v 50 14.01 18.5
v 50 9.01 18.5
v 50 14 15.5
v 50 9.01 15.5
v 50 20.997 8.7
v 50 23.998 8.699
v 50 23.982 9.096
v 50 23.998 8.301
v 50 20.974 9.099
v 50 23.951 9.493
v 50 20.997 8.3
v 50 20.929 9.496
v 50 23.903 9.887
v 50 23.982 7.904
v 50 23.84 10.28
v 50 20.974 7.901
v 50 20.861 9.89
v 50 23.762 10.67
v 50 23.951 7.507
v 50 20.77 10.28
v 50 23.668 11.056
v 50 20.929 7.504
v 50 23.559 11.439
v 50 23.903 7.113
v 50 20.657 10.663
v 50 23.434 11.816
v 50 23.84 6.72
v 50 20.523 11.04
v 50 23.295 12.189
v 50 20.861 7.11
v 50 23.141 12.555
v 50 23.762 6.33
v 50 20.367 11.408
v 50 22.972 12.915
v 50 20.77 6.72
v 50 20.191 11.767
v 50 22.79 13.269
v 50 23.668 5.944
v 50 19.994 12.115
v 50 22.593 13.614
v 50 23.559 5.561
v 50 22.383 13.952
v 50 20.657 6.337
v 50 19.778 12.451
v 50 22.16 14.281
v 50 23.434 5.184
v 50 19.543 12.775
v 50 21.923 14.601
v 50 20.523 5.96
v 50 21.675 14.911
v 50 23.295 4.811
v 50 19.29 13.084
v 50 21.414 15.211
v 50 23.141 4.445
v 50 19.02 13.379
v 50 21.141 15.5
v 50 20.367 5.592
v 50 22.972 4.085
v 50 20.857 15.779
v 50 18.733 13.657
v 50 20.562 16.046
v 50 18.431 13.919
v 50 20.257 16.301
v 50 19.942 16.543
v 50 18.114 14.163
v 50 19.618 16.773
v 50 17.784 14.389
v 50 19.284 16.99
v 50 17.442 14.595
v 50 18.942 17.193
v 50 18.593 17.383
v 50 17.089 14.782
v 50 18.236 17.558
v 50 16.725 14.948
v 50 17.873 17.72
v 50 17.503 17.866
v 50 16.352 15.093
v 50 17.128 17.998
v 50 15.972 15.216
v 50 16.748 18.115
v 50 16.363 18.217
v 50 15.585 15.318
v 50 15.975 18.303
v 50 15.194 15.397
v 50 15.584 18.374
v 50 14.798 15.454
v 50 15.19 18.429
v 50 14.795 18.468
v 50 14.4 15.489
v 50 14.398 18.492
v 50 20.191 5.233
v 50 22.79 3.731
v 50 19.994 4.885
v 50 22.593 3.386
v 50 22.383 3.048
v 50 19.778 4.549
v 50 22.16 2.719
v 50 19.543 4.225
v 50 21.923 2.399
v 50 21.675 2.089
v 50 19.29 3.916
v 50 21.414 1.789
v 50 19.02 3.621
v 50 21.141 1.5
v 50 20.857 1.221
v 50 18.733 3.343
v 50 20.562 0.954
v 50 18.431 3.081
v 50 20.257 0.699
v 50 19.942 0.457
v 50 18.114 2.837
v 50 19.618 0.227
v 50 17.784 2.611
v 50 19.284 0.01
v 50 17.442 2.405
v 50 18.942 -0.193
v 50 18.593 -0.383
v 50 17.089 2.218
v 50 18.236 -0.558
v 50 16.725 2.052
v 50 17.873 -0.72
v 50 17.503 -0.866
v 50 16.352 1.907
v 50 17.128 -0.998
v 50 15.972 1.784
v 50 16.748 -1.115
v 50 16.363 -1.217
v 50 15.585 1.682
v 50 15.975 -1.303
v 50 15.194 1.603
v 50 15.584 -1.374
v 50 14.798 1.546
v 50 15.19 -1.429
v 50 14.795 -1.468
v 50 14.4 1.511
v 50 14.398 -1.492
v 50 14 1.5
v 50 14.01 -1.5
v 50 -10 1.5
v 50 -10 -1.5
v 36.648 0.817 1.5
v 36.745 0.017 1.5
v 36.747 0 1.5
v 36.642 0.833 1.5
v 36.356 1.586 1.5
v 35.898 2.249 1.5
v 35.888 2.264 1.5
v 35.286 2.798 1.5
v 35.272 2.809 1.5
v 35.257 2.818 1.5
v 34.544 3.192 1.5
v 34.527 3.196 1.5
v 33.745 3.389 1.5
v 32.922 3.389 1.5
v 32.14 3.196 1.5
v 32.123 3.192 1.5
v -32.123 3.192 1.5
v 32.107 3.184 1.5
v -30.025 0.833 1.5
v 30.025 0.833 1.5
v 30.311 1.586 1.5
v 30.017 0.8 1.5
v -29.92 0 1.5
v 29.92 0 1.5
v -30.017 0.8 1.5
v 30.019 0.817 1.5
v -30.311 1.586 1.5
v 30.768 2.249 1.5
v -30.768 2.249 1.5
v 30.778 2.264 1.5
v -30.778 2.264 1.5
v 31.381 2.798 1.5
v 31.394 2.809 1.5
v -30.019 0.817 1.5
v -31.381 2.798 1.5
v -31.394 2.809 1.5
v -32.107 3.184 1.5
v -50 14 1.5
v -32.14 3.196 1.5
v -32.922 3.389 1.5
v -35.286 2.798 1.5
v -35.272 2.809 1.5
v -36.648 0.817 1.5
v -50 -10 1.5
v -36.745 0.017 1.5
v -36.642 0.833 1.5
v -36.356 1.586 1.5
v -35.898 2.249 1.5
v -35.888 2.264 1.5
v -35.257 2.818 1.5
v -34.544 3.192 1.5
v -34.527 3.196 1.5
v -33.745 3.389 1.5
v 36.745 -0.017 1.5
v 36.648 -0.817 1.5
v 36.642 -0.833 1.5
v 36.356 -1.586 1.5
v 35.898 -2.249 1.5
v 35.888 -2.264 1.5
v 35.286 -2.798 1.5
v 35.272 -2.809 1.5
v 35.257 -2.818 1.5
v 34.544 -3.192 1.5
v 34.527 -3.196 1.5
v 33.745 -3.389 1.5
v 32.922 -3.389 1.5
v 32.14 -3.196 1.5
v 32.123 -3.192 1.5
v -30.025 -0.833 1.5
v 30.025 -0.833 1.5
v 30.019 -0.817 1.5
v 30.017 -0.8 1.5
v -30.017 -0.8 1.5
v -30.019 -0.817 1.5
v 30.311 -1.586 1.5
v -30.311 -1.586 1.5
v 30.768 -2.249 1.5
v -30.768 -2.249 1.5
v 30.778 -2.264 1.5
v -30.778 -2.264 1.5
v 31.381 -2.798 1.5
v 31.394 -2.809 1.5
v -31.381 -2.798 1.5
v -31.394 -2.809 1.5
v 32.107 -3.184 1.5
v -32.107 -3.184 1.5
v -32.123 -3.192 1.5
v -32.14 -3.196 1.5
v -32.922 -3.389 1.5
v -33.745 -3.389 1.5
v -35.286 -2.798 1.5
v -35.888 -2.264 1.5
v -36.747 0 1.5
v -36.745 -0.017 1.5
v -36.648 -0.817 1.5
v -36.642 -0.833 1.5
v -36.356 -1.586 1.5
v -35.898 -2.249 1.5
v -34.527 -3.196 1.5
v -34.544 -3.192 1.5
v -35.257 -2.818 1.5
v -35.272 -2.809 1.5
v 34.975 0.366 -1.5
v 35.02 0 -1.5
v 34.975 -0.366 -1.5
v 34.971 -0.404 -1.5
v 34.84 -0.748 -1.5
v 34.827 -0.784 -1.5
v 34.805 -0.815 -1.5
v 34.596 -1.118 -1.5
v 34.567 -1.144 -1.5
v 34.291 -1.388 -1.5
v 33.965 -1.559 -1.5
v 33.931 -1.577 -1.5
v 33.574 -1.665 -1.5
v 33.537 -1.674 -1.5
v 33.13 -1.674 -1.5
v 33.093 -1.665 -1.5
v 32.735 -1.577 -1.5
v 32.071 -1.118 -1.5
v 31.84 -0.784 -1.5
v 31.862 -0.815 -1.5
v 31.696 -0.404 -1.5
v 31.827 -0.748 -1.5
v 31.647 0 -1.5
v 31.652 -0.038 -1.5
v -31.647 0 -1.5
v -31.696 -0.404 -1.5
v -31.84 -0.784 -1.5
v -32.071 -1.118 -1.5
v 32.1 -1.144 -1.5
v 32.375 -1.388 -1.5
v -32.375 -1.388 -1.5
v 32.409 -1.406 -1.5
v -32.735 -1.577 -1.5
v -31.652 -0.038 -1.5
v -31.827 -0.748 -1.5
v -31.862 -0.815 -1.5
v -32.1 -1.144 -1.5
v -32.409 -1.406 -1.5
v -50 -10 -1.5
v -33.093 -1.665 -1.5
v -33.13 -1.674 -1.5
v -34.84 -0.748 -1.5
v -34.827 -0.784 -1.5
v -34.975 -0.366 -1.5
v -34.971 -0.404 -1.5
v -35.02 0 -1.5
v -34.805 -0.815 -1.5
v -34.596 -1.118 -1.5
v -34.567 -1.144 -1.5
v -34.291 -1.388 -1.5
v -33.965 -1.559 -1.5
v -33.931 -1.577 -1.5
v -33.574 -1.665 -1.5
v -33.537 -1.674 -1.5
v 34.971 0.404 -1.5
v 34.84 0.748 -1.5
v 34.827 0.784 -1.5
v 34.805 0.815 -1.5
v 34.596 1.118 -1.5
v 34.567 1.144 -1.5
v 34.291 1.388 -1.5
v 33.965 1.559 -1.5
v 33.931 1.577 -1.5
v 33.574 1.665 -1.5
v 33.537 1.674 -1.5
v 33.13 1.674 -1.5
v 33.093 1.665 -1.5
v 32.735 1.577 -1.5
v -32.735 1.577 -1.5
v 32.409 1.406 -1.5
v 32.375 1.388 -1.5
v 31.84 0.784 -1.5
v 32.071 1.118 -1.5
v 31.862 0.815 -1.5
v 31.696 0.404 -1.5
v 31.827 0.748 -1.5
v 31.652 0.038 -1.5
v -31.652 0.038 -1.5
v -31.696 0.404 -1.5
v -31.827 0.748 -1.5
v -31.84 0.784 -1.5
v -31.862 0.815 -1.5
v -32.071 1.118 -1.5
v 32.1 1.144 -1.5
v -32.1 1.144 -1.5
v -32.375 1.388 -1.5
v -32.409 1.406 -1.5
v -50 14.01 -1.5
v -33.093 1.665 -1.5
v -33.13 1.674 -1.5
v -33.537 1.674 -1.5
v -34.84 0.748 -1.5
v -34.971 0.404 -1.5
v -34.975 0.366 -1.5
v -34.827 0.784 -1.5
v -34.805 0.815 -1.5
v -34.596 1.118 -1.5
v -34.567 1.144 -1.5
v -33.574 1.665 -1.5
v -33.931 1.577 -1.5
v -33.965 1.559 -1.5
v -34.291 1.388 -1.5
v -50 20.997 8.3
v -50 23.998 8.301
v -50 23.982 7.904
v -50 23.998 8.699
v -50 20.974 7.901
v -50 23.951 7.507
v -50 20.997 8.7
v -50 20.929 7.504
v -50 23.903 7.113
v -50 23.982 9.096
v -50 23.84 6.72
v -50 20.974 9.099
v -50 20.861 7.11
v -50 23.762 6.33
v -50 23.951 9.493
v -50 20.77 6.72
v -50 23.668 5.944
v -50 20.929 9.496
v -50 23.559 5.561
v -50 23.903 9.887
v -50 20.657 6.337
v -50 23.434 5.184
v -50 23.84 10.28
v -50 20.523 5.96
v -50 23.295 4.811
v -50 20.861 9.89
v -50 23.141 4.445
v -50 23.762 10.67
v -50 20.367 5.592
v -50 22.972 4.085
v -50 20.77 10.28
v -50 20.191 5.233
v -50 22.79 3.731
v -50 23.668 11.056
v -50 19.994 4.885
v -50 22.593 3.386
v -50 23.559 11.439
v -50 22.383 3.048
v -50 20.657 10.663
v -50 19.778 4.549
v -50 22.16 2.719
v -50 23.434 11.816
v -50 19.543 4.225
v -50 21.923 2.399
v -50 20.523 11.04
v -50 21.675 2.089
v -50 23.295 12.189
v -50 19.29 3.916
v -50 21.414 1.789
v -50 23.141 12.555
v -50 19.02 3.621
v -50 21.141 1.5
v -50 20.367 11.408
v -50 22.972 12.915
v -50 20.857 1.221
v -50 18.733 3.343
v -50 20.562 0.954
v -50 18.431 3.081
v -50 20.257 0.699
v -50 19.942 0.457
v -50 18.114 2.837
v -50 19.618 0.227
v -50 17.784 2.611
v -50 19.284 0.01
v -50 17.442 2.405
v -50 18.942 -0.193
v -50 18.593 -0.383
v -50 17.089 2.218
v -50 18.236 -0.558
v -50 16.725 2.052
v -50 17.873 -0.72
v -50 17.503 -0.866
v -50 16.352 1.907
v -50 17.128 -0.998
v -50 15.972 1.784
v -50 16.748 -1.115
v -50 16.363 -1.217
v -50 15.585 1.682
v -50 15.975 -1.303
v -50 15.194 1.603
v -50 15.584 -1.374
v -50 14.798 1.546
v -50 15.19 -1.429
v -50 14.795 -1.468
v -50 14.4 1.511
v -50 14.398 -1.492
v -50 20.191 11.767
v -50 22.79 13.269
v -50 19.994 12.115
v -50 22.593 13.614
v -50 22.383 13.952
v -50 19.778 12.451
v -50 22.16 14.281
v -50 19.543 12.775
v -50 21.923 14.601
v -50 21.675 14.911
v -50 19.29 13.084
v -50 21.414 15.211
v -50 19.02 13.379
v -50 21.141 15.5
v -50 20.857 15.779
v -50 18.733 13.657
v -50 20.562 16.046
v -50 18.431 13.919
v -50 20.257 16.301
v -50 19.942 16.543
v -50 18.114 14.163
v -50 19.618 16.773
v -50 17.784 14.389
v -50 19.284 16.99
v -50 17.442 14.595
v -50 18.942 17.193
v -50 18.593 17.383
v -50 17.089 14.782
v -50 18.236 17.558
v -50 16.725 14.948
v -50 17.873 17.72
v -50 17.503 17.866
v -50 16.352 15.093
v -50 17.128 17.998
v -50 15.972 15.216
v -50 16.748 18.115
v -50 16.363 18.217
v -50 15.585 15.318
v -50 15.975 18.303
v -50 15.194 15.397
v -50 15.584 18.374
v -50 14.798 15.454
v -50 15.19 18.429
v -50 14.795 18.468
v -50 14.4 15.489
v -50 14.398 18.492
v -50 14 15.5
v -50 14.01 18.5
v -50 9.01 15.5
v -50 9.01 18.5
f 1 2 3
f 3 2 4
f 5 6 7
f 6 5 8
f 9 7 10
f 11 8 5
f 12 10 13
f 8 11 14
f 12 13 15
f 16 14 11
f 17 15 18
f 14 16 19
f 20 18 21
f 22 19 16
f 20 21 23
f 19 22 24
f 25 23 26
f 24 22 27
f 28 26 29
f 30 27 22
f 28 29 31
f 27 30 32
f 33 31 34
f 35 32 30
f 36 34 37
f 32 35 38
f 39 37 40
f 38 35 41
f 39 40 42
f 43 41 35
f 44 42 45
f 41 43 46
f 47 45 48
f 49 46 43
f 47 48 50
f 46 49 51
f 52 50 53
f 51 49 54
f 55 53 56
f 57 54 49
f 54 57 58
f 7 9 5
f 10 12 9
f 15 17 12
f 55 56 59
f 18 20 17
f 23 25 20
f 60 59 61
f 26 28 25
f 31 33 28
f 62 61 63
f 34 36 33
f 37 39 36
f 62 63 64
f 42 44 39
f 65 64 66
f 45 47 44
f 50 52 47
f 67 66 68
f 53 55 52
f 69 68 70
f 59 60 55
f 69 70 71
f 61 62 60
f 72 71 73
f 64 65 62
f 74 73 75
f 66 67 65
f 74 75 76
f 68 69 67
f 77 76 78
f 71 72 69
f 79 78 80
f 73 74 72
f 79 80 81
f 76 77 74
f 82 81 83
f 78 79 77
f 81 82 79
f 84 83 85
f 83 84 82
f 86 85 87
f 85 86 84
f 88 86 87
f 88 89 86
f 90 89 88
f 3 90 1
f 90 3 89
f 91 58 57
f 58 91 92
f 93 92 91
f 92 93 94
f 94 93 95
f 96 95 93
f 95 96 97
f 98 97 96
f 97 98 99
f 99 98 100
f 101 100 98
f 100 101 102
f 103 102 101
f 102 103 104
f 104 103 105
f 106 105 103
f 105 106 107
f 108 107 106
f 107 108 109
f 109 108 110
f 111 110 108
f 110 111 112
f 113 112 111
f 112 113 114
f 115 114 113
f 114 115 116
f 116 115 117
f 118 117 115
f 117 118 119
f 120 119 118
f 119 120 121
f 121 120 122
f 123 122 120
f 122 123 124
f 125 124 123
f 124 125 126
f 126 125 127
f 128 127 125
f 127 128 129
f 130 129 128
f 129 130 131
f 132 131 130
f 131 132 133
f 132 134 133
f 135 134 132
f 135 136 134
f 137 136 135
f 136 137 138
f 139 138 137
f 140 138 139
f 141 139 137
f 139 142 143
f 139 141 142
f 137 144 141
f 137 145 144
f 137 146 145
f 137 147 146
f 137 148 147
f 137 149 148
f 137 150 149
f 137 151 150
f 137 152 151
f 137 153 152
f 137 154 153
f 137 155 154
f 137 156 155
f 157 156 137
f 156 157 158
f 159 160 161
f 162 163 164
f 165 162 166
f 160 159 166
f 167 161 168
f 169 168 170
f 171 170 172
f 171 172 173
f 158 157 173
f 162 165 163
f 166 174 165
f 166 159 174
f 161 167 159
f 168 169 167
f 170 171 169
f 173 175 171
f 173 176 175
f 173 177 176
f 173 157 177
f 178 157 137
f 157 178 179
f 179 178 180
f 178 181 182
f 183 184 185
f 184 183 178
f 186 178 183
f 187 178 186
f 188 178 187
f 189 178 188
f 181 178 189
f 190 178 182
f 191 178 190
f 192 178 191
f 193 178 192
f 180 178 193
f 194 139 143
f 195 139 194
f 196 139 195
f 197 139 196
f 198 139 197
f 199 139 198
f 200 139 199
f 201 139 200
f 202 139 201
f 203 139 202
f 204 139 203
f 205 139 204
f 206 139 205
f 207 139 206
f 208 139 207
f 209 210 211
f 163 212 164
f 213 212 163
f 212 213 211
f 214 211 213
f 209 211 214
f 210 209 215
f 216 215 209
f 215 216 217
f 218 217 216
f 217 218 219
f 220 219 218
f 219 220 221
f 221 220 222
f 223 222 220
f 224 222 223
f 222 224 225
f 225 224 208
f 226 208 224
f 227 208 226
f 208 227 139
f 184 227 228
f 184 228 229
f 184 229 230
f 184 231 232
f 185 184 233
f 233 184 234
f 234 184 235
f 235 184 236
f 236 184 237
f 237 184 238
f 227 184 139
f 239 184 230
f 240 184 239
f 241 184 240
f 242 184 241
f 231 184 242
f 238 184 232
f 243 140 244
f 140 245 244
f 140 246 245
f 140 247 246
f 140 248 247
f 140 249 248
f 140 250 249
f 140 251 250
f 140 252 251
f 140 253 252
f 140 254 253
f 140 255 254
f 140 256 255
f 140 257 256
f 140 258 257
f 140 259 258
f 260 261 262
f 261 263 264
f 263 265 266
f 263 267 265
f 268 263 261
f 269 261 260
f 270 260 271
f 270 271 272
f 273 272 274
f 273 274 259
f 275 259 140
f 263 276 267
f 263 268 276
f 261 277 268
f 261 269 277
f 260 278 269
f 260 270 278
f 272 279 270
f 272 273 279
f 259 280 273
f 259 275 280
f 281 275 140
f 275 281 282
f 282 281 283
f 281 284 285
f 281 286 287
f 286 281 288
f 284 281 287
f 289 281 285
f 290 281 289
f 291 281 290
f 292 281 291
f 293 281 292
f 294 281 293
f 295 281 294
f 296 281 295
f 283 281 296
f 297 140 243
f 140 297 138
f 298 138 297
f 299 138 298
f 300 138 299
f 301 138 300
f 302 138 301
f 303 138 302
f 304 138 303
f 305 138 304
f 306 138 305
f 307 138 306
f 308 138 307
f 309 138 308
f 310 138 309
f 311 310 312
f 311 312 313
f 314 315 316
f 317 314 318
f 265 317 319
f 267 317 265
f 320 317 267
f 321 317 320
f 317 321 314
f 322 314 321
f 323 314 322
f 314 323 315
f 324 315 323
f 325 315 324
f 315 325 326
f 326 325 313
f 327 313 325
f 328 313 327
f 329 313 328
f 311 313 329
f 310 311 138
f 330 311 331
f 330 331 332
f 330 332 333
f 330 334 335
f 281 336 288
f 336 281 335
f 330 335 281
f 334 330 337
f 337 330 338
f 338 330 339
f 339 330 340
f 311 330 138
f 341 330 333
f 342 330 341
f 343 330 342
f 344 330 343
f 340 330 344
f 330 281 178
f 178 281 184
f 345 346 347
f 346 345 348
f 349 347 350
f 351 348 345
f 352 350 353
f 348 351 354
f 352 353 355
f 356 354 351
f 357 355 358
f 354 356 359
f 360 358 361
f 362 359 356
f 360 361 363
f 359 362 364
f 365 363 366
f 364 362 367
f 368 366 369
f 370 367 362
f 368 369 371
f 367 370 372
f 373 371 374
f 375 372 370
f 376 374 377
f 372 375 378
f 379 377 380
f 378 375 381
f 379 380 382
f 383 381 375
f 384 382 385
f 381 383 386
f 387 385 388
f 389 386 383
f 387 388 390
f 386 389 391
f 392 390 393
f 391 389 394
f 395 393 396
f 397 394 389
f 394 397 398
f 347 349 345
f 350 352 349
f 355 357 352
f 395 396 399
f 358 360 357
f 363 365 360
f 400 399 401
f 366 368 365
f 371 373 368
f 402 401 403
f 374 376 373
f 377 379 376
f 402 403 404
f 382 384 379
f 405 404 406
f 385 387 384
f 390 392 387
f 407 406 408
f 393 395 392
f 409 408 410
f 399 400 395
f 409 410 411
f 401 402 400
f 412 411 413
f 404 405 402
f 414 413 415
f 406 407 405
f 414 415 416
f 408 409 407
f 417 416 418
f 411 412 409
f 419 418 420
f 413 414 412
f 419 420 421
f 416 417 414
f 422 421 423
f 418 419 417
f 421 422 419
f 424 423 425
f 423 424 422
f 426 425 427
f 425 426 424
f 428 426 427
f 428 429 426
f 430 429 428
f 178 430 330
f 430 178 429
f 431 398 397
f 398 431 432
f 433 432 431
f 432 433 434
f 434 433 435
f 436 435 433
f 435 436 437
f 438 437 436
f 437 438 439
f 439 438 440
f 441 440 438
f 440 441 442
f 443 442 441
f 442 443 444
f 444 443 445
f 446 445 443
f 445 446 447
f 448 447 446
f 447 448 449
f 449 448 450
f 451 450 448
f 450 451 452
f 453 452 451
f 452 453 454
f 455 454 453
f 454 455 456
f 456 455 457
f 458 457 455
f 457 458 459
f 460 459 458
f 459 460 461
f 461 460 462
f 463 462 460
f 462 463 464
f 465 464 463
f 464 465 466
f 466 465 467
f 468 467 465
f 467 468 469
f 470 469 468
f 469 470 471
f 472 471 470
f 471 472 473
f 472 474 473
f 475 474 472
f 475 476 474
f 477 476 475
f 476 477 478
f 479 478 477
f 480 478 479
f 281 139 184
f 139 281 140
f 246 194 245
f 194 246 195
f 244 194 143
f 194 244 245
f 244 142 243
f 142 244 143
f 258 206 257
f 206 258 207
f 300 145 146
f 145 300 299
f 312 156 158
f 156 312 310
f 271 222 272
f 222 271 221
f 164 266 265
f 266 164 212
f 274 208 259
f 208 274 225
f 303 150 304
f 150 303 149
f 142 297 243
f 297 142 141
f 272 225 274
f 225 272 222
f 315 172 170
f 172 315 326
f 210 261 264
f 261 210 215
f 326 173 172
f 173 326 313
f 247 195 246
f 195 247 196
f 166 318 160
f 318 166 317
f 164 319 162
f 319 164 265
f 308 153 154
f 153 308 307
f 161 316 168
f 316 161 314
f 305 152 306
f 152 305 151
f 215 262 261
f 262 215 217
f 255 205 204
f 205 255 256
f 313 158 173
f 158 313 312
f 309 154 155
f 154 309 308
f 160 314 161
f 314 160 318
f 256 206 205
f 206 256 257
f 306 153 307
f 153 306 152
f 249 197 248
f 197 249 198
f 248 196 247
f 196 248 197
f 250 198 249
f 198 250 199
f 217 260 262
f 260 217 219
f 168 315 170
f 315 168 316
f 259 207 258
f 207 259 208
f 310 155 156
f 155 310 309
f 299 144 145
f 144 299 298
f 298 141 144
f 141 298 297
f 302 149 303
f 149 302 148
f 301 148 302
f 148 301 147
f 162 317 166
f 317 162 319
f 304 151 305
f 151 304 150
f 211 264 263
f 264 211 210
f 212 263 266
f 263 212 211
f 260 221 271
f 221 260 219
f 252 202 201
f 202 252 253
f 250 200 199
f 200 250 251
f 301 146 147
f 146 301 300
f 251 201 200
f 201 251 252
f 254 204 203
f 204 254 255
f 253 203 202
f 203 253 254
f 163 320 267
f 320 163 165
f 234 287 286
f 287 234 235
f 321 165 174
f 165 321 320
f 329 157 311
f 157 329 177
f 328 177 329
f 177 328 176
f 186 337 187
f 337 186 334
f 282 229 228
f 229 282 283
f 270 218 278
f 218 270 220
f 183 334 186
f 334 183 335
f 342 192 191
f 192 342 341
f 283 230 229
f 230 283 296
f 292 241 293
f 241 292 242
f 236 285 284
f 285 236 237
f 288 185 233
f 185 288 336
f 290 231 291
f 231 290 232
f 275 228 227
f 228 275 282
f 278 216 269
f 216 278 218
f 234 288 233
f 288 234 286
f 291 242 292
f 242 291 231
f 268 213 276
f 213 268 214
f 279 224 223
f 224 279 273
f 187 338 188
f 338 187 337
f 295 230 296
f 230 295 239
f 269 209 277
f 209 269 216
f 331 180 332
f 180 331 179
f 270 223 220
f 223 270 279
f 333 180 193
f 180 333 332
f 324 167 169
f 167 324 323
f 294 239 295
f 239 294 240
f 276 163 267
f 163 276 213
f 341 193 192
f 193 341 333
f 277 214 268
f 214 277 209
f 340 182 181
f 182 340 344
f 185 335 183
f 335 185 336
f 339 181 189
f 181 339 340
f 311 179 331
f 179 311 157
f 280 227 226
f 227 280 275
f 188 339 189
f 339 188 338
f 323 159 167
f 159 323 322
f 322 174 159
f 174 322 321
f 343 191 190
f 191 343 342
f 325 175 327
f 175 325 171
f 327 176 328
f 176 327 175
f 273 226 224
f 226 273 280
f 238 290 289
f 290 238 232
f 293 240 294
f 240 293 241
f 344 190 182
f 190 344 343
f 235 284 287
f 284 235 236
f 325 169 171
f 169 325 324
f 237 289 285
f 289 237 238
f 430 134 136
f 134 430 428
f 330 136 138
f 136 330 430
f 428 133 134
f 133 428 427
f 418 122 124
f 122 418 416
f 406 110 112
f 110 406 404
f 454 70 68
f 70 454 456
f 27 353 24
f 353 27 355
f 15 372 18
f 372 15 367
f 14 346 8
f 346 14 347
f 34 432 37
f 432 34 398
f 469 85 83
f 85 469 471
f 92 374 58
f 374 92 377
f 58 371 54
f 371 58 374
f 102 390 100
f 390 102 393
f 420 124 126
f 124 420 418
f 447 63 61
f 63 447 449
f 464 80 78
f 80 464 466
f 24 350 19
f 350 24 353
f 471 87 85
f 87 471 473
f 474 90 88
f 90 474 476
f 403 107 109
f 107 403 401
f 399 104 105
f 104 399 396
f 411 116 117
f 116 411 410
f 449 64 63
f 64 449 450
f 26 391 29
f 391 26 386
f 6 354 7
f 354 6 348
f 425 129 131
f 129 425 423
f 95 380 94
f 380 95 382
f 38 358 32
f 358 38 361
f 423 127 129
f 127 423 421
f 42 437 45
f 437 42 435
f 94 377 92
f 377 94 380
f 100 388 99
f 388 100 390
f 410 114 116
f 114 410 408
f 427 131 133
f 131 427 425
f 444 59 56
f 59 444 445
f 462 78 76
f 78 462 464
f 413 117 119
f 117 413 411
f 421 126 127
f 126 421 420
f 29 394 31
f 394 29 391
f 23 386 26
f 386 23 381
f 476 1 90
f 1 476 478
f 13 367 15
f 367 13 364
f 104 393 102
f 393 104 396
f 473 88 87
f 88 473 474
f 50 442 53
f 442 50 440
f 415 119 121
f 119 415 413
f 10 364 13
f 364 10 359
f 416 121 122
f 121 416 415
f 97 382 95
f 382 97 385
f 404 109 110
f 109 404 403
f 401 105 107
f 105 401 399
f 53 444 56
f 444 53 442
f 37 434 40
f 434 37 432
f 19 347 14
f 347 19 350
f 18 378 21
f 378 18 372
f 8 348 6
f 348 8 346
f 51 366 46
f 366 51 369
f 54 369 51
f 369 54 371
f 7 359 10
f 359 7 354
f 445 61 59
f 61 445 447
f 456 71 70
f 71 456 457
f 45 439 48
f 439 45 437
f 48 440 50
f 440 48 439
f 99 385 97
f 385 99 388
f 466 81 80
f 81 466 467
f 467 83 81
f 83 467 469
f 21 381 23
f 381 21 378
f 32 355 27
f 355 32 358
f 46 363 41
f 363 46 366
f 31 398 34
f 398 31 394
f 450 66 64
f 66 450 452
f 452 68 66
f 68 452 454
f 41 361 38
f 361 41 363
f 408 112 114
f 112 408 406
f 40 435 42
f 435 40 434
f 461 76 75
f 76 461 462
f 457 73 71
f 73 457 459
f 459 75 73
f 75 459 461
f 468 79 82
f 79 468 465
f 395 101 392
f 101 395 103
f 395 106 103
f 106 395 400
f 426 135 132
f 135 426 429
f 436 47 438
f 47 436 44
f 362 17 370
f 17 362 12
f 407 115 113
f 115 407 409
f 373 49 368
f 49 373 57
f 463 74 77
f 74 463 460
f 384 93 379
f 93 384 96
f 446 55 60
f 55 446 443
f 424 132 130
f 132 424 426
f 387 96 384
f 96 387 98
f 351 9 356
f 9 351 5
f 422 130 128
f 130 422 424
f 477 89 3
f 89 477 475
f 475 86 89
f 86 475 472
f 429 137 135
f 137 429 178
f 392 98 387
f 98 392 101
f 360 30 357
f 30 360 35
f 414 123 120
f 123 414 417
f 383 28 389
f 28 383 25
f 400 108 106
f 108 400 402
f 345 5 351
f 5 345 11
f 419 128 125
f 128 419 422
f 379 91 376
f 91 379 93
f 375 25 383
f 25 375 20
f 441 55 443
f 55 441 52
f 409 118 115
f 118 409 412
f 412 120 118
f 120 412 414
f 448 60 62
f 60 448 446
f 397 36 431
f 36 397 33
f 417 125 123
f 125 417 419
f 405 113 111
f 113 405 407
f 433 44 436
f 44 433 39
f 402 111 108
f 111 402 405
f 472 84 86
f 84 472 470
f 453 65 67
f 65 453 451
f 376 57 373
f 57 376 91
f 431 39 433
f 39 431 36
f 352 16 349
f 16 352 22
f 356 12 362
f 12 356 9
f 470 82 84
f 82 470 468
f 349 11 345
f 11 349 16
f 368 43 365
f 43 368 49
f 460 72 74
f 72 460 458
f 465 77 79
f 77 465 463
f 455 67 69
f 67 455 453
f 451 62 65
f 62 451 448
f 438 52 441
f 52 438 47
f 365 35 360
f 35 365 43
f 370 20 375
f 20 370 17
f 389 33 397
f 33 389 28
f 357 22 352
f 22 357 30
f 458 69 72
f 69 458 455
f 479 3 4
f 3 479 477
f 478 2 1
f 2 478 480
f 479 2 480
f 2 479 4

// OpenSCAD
// file: parts/countersink.scad
module countersink(base_radius = 2, top_radius = 1.6, height = 2) {
    scale_ration = top_radius / base_radius;
    linear_extrude(height,center=true, scale=scale_ration) {
        circle(base_radius);
    }
}

countersink();
// main file
use <parts/countersink.scad>
$fa = 1;
$fs = 0.4;

width = 100;
height = 20;
depth = 3;
radius=10;
lip_length = 5;
epsilon = 0.01;

module pipe(length, outer_radius, width, lip_length) {
    inner_radius = outer_radius - width;
    difference() {
        cylinder(h=length, r=outer_radius, center=true);
        translate([0, -outer_radius, 0]) 
            cube([outer_radius * 2, outer_radius * 2, length * 1.1], center=true);
        cylinder(h=length*1.1, r=inner_radius, center=true);
    }
    translate([outer_radius - width/2, -lip_length/2 + epsilon, 0])
        cube([width, lip_length, length], center=true);    
    translate([-(outer_radius - width/2), -lip_length/2 + epsilon, 0])
        cube([width, lip_length, length], center=true);
}

module main() {
    difference() {
        cube([width, height, depth], center=true);
        translate([width/3,0,0])
            countersink(height=depth*1.1, base_radius=1.6, top_radius =3.5);
        translate([-width/3,0,0])
            countersink(height=depth*1.1, base_radius=1.6, top_radius =3.5);
    }
    translate([0, height/2 + lip_length * 0.8, radius - depth/2 ])
    rotate([0,90,0])
        pipe(length = width, width= depth, outer_radius=radius, lip_length=lip_length);
}



main();
